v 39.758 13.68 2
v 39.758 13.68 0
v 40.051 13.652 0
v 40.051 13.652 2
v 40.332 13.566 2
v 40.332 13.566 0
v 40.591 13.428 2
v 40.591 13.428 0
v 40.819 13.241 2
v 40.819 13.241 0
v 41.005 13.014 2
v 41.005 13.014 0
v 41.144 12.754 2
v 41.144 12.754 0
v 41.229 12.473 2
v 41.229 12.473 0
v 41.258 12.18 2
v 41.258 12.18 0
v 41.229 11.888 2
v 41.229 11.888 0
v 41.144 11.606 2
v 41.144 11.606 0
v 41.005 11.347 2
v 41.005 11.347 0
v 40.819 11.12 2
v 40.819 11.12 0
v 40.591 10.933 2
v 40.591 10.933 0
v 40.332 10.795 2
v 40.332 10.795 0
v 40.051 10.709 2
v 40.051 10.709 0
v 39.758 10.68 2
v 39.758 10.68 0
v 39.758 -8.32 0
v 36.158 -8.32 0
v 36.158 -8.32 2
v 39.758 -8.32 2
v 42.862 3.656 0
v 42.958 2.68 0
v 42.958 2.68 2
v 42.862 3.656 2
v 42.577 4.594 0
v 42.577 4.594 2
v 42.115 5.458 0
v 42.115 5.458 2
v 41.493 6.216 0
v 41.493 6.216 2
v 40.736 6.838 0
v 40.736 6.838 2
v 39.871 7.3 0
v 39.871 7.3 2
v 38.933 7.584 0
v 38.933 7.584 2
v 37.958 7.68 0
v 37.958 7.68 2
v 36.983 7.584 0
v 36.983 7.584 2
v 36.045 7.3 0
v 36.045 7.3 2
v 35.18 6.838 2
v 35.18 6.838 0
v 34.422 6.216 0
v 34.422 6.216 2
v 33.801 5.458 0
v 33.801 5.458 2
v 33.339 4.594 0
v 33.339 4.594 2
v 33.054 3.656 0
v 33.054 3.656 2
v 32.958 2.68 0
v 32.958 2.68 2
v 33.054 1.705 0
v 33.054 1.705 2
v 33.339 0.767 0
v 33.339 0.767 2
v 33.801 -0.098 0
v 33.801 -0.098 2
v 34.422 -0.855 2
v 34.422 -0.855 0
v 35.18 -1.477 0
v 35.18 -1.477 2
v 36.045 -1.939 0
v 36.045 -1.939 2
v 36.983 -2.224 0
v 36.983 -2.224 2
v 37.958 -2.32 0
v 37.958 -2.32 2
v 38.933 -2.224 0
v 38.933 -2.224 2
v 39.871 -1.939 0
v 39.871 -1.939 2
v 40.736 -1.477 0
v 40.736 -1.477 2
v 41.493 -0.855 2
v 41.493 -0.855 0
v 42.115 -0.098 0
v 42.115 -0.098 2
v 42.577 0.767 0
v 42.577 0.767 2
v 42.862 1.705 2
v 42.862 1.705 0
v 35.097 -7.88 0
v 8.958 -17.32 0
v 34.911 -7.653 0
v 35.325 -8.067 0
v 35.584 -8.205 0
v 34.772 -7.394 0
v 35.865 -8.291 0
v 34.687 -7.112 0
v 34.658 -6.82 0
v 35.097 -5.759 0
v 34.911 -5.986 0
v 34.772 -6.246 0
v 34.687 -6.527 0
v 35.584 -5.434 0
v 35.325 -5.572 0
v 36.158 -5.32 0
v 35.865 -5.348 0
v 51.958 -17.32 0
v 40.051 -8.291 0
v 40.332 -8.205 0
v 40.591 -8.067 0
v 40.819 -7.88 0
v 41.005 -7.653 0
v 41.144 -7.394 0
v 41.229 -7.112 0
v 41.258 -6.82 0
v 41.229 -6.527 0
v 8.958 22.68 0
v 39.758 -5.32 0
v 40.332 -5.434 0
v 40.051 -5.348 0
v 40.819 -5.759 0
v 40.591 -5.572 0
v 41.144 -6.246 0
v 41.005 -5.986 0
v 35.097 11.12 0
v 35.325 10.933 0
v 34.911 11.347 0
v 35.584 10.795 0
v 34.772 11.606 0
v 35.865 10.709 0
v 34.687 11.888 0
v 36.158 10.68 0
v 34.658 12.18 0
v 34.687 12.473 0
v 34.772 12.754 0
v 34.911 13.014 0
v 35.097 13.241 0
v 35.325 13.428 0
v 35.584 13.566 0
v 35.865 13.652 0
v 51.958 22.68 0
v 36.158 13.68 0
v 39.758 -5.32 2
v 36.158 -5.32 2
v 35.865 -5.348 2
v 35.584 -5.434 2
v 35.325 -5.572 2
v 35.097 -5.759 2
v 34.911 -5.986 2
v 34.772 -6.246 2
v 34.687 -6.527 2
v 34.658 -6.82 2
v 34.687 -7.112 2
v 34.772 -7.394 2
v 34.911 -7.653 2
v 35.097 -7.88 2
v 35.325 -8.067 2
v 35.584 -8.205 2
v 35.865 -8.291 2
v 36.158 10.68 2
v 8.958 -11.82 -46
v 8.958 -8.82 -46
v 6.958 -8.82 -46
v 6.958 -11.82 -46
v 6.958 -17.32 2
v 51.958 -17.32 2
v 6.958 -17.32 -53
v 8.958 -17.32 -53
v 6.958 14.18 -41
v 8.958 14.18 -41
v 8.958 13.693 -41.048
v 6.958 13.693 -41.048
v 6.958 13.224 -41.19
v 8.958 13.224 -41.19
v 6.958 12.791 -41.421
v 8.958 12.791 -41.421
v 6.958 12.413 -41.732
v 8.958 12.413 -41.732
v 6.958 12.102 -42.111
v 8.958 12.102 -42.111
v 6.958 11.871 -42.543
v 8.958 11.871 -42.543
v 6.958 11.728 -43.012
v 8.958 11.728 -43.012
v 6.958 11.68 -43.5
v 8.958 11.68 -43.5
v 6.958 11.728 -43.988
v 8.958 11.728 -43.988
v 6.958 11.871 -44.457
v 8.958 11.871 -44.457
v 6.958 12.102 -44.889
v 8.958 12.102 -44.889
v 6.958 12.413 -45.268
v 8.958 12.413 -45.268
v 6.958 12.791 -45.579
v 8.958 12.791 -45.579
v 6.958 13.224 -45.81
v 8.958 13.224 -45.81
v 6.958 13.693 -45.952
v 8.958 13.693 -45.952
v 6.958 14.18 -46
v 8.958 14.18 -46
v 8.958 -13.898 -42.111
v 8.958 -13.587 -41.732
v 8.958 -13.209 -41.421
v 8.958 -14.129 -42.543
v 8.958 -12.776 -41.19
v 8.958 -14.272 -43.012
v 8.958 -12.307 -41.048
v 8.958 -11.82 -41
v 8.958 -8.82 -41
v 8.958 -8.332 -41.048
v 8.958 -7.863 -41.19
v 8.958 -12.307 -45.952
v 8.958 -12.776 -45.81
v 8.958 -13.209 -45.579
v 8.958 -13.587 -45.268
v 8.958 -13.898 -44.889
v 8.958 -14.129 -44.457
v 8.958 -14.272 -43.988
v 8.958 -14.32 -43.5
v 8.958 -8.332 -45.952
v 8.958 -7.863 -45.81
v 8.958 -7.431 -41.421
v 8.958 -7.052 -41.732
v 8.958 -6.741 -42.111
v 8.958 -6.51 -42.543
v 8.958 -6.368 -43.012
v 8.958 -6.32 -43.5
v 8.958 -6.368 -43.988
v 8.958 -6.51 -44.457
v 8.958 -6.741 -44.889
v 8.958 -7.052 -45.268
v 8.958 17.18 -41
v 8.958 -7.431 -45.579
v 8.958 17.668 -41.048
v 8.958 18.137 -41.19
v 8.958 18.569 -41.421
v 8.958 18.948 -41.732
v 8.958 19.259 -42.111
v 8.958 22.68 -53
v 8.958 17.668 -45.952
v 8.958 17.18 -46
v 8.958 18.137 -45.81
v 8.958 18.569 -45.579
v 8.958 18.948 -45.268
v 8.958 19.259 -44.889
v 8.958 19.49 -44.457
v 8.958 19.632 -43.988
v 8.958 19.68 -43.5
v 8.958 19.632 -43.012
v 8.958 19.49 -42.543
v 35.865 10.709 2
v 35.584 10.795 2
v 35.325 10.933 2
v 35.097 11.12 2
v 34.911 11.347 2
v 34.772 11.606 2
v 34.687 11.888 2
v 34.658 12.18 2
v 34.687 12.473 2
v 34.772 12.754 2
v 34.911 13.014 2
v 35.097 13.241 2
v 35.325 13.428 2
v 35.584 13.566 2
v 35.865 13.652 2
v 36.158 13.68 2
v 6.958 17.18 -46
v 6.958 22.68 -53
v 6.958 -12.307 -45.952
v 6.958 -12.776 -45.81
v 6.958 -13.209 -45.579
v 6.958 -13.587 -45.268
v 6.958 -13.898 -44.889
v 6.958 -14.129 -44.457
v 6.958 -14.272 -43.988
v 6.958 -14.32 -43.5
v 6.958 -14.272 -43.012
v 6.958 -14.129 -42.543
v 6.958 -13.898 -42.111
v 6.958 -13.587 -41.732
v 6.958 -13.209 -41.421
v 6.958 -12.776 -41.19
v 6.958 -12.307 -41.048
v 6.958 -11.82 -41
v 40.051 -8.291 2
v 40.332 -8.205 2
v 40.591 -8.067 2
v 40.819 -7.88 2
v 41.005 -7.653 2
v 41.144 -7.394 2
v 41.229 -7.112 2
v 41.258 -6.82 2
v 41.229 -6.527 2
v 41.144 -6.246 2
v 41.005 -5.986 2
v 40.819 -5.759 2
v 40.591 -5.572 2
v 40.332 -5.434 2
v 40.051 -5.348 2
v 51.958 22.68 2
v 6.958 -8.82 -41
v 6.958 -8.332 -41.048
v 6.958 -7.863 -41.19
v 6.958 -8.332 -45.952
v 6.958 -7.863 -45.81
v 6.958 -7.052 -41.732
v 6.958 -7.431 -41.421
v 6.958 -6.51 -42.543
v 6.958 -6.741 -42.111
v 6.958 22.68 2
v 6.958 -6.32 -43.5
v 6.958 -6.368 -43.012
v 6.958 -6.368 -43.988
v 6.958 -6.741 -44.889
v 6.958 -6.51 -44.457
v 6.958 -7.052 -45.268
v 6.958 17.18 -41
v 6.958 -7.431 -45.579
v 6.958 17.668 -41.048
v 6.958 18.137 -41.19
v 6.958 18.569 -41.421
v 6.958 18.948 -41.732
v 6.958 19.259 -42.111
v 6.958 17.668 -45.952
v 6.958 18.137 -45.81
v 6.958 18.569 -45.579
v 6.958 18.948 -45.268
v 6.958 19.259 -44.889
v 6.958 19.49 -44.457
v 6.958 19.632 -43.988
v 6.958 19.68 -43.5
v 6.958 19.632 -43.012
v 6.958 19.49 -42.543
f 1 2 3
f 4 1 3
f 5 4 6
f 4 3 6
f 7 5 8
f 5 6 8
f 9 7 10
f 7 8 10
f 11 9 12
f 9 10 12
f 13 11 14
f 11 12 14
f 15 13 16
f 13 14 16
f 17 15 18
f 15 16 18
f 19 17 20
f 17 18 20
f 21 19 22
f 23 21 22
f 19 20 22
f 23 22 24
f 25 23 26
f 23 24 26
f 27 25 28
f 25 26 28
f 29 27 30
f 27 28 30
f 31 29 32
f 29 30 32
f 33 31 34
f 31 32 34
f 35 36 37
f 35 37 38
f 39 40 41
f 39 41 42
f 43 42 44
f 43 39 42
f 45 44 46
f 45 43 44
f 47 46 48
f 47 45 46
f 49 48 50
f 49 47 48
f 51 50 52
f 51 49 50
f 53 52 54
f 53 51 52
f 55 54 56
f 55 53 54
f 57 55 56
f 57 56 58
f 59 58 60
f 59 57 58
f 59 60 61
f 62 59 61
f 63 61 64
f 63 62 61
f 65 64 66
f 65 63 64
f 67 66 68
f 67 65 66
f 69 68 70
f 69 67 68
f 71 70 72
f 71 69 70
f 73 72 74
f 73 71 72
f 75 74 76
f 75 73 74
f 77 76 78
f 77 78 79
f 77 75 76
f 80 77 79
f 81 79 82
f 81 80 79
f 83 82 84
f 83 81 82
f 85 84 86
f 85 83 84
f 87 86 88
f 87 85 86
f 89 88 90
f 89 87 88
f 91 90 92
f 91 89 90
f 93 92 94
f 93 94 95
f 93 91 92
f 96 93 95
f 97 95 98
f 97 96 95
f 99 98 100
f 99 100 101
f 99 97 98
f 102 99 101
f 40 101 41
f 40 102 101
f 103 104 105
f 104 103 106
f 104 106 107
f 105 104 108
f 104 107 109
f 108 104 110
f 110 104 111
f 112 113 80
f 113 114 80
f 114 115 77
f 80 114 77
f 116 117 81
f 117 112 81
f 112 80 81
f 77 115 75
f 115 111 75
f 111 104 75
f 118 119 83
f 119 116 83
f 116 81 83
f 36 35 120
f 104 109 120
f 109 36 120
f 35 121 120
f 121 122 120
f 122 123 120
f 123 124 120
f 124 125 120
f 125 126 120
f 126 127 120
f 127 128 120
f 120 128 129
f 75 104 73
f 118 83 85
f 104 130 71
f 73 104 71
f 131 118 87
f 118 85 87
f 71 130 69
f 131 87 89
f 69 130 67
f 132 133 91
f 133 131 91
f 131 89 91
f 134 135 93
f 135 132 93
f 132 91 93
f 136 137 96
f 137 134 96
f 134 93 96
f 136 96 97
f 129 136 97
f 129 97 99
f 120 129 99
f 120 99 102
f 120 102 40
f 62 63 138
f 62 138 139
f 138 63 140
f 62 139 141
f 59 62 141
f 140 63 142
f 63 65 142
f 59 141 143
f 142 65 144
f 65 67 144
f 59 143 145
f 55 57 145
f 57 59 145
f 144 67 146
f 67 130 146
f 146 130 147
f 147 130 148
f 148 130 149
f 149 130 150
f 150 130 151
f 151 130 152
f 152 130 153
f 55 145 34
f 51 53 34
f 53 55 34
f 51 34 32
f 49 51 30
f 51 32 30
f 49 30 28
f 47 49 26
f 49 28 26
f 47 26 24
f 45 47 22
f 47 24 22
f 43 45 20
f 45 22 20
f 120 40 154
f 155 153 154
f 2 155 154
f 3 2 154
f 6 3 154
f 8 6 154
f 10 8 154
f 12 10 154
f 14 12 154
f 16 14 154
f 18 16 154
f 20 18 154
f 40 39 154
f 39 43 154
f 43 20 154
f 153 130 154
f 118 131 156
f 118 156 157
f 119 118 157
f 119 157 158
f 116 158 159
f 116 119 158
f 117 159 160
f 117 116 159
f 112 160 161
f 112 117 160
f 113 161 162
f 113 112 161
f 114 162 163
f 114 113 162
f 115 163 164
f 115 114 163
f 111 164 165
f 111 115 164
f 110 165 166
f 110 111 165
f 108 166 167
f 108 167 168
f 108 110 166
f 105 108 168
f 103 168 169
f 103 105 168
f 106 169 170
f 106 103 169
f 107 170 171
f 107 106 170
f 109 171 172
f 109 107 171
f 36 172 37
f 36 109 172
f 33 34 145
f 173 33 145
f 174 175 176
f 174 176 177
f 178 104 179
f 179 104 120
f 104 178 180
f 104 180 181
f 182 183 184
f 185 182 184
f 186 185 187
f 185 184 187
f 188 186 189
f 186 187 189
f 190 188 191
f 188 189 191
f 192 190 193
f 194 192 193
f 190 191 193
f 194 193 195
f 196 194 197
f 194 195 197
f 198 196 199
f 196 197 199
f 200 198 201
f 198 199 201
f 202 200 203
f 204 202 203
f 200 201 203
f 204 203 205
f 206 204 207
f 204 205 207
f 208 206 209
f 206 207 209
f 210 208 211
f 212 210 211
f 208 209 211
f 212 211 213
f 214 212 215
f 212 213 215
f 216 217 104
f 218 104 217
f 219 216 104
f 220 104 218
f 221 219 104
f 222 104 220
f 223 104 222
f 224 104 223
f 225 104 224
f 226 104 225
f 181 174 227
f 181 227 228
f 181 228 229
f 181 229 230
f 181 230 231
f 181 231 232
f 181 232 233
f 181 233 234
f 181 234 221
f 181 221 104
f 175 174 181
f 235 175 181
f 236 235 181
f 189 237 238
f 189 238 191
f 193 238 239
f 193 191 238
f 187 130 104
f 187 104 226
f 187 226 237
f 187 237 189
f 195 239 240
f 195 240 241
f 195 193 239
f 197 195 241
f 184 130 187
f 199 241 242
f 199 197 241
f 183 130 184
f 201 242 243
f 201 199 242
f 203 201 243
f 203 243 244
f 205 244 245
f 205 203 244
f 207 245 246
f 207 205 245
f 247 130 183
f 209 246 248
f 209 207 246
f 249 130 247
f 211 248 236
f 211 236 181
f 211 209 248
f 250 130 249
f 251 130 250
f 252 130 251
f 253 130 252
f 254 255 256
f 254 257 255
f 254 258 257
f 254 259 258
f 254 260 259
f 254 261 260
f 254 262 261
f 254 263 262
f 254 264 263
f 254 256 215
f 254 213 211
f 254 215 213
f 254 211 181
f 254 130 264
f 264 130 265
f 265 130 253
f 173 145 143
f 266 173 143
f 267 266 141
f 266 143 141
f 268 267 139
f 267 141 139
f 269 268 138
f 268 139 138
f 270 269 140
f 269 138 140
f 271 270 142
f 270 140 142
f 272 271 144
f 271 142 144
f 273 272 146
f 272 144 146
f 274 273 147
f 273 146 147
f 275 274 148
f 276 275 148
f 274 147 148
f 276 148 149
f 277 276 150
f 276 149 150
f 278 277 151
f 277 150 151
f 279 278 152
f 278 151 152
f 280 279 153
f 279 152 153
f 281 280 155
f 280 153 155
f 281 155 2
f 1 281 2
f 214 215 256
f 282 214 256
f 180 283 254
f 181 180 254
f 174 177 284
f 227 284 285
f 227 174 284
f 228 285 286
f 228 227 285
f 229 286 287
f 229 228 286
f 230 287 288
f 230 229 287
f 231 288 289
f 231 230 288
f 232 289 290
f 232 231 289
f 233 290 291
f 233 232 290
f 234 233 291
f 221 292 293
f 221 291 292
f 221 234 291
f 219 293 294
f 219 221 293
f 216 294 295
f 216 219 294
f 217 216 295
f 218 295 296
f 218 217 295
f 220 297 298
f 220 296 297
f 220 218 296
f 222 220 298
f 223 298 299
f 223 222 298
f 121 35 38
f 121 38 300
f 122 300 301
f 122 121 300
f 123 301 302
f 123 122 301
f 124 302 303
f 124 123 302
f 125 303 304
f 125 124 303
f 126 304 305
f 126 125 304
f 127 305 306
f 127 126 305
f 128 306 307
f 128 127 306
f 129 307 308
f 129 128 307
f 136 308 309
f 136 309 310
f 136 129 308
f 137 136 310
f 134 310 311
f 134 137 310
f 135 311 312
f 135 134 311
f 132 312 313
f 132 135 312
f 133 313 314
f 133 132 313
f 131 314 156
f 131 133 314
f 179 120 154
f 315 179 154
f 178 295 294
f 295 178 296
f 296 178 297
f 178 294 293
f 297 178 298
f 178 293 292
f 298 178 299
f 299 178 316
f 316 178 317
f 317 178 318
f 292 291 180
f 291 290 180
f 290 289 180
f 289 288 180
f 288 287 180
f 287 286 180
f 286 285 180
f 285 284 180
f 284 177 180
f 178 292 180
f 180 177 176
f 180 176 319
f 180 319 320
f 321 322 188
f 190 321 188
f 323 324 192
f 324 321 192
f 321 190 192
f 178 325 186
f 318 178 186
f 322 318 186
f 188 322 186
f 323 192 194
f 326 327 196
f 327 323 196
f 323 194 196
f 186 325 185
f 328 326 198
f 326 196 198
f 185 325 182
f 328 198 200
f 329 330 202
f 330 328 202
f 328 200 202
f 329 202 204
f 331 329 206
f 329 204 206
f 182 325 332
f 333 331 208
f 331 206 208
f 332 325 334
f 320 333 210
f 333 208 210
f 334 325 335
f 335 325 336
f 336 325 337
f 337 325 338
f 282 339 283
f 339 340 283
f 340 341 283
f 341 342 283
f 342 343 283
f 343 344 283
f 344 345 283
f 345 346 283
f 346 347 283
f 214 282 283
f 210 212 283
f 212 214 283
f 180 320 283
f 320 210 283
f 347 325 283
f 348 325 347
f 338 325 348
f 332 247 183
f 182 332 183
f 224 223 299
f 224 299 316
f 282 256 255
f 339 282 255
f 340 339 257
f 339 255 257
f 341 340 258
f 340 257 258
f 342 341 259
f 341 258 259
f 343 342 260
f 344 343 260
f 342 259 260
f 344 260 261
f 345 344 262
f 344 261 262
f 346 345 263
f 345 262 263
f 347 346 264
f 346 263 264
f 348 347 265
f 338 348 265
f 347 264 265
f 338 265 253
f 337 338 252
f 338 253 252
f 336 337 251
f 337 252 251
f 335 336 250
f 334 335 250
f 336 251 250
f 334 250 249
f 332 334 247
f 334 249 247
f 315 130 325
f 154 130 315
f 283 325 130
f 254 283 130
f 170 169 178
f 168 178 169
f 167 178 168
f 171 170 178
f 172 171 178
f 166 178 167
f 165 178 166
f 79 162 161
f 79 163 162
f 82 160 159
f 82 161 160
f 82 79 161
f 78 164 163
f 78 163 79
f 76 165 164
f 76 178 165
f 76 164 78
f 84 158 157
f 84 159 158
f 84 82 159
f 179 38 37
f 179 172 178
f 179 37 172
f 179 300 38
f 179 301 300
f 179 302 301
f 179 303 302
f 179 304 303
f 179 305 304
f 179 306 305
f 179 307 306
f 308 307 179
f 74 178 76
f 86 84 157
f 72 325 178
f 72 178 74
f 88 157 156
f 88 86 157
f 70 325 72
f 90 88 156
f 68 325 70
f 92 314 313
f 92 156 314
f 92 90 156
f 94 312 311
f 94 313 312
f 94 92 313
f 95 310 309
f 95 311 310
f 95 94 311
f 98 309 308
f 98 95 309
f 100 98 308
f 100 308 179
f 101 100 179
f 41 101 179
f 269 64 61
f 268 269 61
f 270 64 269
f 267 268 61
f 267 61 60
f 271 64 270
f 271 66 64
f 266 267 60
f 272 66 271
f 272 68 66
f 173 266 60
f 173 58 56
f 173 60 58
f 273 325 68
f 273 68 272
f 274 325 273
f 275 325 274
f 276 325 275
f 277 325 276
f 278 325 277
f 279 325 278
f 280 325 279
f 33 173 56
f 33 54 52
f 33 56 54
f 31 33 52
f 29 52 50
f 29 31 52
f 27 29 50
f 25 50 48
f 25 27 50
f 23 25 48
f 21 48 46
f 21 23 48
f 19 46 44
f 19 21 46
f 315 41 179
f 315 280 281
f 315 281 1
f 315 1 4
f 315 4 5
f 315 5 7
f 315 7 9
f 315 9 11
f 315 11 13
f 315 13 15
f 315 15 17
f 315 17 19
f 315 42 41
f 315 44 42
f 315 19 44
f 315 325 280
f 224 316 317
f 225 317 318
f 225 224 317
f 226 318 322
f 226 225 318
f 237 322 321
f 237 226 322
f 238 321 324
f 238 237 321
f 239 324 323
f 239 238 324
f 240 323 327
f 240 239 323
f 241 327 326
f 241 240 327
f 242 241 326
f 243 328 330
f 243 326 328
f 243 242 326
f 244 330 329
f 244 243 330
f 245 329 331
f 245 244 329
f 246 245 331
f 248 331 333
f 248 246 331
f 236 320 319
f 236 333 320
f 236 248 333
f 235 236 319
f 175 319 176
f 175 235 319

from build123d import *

# Parameters (mm, degrees)
ESQUISSE2_W             = 45
ESQUISSE2_H             = 40
ESQUISSE2_R             = 5
BOSS_EXTRU_8_DEPTH      = 2
ESQUISSE3_W             = 2
ESQUISSE3_H             = 53
BOSS_EXTRU_9_DEPTH      = 40
ENL_V_MAT_EXTRU_1_DEPTH = 40


with BuildPart() as part:
    # Esquisse2 → Boss.-Extru.8 (new body)
    with BuildSketch(Plane.XY):
        with Locations((29.457965055, 2.680327869)):
            Rectangle(ESQUISSE2_W, ESQUISSE2_H)
        with Locations((37.957965055, 2.680327869)):
            Circle(ESQUISSE2_R, mode=Mode.SUBTRACT)
        with BuildLine():
            Line((36.157965055, 13.680327869), (39.757965055, 13.680327869))
            ThreePointArc((39.757965055, 13.680327869), (41.257965055, 12.180327869), (39.757965055, 10.680327869))
            Line((39.757965055, 10.680327869), (36.157965055, 10.680327869))
            ThreePointArc((36.157965055, 10.680327869), (34.657965055, 12.180327869), (36.157965055, 13.680327869))
        make_face(mode=Mode.SUBTRACT)
        with BuildLine():
            Line((36.157965055, -8.319672131), (39.757965055, -8.319672131))
            ThreePointArc((39.757965055, -8.319672131), (41.257965055, -6.819672131), (39.757965055, -5.319672131))
            Line((39.757965055, -5.319672131), (36.157965055, -5.319672131))
            ThreePointArc((36.157965055, -5.319672131), (34.657965055, -6.819672131), (36.157965055, -8.319672131))
        make_face(mode=Mode.SUBTRACT)
    extrude(amount=BOSS_EXTRU_8_DEPTH)

    # Esquisse3 → Boss.-Extru.9 (add)
    with BuildSketch(Plane(origin=(0, 22.680327869, 0), x_dir=(1, 0, 0), z_dir=(0, 1, 0))):
        with Locations((7.957965055, 26.5)):
            Rectangle(ESQUISSE3_W, ESQUISSE3_H)
    extrude(amount=-BOSS_EXTRU_9_DEPTH)

    # Esquisse4 → Enlèv. mat.-Extru.1 (cut)
    with BuildSketch(Plane(origin=(8.957965055, 0, 0), x_dir=(0, 0, -1), z_dir=(1, 0, 0))):
        with BuildLine():
            Line((41, -11.819672131), (41, -8.819672131))
            ThreePointArc((41, -8.819672131), (43.5, -6.319672131), (46, -8.819672131))
            Line((46, -8.819672131), (46, -11.819672131))
            ThreePointArc((46, -11.819672131), (43.5, -14.319672131), (41, -11.819672131))
        make_face()
        with BuildLine():
            Line((41, 17.180327869), (41, 14.180327869))
            ThreePointArc((41, 14.180327869), (43.5, 11.680327869), (46, 14.180327869))
            Line((46, 14.180327869), (46, 17.180327869))
            ThreePointArc((46, 17.180327869), (43.5, 19.680327869), (41, 17.180327869))
        make_face()
    extrude(amount=-ENL_V_MAT_EXTRU_1_DEPTH, mode=Mode.SUBTRACT)


solid = part.part
